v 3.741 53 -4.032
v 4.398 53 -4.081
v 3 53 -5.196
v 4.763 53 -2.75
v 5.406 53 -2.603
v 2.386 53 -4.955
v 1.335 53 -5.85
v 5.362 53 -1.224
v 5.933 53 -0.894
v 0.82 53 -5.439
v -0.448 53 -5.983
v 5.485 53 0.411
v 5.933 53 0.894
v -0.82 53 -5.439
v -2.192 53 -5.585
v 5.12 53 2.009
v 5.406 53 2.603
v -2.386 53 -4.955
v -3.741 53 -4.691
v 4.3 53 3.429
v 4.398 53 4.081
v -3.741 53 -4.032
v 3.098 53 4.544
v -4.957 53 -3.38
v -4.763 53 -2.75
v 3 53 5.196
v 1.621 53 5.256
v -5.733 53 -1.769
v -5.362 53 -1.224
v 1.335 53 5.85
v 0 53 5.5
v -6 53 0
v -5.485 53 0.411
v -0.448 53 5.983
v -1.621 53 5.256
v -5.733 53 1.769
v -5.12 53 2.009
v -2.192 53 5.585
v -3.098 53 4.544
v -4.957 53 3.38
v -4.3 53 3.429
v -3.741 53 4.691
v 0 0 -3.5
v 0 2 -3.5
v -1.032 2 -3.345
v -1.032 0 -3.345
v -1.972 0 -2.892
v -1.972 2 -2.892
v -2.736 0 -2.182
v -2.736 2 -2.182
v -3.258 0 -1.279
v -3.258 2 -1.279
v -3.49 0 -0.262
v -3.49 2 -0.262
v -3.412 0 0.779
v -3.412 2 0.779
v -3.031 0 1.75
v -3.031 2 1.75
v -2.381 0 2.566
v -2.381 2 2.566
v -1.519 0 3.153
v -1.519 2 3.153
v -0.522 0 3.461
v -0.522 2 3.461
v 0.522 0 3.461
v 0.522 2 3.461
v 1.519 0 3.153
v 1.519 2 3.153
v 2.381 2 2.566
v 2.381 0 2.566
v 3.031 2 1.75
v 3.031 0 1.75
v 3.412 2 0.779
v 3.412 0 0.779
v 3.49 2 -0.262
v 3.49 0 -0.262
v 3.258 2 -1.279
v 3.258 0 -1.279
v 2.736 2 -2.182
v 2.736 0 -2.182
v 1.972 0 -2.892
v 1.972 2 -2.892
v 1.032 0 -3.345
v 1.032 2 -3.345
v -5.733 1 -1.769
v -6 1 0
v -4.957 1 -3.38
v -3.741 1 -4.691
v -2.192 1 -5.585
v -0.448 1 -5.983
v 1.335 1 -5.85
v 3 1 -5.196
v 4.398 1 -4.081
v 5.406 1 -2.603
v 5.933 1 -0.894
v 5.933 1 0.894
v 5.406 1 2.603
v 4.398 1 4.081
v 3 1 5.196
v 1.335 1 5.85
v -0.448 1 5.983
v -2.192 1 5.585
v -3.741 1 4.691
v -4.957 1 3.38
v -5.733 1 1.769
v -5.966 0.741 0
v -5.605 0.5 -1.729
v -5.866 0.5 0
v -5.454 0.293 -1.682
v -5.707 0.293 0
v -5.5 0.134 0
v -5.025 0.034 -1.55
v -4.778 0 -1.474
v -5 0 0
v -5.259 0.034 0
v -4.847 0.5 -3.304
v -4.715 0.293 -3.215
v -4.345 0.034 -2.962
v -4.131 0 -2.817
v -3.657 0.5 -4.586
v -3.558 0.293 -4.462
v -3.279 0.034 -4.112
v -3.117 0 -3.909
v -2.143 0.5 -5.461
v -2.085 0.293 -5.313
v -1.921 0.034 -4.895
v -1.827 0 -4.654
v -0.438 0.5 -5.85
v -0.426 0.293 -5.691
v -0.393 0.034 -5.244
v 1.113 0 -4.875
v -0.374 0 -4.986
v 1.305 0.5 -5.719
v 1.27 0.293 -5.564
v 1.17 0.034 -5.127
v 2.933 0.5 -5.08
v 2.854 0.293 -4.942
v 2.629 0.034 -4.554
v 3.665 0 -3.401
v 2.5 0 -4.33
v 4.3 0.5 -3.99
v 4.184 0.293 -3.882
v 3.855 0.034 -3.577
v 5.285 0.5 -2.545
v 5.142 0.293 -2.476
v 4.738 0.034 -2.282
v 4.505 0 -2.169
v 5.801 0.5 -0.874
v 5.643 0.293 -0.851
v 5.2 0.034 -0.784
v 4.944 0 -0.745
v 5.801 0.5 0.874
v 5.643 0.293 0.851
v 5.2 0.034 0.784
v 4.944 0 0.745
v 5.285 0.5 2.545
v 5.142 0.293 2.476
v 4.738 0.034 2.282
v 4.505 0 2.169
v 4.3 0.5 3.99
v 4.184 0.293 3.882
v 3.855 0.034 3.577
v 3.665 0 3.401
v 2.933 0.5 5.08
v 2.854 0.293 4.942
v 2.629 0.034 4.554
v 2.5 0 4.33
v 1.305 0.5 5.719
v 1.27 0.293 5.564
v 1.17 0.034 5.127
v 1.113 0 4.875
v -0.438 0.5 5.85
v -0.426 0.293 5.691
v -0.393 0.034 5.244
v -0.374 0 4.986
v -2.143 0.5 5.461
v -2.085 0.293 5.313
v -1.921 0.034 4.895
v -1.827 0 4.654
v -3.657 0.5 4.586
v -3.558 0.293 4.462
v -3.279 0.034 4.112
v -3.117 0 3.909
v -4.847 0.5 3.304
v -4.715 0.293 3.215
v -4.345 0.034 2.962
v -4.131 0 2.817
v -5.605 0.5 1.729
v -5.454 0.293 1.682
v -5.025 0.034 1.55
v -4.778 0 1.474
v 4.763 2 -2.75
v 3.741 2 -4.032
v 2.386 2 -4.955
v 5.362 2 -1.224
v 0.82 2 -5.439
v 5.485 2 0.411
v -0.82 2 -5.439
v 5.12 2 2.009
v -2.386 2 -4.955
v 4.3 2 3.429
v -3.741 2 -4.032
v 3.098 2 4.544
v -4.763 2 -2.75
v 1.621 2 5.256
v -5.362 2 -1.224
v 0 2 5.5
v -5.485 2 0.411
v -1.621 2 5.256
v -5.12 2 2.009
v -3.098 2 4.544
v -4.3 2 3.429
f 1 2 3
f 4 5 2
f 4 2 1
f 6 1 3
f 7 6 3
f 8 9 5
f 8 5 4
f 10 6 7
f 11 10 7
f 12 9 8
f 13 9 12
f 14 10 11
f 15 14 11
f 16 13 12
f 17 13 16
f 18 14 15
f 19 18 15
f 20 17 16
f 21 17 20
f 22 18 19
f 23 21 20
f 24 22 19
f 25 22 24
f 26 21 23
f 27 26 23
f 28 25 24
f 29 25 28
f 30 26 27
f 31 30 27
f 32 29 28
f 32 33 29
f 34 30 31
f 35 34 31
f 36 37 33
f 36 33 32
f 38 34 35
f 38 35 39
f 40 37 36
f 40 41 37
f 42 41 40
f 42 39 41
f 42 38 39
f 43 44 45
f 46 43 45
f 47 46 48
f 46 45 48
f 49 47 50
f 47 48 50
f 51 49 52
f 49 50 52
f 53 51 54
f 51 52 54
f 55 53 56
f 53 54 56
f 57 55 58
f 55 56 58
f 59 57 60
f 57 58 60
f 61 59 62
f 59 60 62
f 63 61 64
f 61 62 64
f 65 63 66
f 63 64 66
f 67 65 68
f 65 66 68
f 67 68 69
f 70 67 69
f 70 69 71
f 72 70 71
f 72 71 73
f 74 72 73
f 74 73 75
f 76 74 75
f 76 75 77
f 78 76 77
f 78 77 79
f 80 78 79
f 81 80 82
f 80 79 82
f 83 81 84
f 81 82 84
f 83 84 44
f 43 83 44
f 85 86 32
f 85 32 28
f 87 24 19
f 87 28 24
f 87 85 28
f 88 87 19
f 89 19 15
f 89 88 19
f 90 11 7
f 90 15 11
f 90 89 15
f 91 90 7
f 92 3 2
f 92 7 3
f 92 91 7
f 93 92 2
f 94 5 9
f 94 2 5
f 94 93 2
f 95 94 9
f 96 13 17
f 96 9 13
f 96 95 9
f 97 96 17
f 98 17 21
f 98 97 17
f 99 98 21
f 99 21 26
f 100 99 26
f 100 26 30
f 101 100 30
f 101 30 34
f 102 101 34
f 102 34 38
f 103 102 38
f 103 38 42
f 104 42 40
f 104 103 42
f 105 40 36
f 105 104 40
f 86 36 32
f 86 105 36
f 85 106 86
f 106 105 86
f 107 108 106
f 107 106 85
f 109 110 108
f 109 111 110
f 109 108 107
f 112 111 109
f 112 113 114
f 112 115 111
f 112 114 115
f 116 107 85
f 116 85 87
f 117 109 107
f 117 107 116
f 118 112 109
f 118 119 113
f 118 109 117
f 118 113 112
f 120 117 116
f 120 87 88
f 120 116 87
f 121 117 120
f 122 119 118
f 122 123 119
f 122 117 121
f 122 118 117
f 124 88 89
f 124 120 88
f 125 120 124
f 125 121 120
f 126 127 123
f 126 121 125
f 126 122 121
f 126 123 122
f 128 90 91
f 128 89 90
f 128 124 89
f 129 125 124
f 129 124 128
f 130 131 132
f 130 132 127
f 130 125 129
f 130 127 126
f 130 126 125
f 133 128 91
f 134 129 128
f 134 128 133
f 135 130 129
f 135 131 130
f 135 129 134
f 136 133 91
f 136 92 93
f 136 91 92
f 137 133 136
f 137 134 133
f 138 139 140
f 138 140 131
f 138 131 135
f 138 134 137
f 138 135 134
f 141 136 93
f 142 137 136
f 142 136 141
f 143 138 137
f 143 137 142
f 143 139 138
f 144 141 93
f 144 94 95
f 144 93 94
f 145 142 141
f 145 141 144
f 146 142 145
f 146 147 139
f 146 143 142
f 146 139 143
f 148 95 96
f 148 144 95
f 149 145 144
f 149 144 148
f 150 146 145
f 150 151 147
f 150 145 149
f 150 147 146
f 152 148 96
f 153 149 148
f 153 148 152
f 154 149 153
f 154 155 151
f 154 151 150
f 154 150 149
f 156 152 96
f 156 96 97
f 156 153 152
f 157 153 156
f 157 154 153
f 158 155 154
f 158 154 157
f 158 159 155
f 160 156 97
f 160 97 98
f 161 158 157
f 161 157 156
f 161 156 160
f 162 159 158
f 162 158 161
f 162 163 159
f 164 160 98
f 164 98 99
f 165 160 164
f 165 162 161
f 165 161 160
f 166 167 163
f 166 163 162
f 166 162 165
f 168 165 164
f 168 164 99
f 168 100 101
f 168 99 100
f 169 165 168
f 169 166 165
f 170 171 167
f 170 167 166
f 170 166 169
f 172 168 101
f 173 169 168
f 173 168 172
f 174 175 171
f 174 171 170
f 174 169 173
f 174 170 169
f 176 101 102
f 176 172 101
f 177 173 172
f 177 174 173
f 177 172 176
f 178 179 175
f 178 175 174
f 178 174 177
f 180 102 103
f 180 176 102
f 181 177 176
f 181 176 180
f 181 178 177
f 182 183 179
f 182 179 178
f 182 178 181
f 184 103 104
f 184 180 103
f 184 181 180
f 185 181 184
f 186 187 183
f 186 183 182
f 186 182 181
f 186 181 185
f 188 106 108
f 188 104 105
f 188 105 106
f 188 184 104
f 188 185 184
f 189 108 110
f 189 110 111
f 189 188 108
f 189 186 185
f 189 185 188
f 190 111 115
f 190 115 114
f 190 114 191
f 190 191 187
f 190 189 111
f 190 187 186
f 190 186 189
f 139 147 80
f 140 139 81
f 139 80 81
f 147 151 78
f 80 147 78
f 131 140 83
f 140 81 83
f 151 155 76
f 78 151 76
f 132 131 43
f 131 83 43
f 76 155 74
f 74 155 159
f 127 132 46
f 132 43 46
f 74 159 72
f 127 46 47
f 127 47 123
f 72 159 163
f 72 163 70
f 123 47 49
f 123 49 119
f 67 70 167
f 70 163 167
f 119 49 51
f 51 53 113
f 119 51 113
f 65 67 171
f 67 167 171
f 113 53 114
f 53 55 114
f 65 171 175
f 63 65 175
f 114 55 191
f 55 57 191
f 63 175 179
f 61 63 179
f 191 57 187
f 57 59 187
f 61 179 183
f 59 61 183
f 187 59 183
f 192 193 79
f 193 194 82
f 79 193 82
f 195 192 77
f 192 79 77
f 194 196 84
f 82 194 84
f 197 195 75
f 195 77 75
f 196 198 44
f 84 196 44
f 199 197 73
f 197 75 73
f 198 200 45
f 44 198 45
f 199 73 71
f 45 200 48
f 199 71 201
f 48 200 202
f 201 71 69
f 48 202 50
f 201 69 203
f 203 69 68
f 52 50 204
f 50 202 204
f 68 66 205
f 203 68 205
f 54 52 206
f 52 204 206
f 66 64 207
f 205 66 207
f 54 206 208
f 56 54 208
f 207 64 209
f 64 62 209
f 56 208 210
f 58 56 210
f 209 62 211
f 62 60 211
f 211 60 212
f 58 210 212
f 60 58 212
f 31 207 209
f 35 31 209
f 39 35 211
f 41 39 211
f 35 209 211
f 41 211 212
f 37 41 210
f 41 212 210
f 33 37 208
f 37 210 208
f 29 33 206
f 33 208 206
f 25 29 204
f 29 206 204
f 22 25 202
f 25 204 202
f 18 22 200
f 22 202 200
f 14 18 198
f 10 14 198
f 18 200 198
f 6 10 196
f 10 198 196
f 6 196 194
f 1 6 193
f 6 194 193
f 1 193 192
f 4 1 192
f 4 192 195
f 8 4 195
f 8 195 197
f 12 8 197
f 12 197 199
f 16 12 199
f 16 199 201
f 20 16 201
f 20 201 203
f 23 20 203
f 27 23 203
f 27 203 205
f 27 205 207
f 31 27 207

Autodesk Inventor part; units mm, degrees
ref_plane "YZ Plane" through (0, 0, 0) normal (1, 0, 0) x (0, 1, 0)
ref_plane "XZ Plane" through (0, 0, 0) normal (0, 1, 0) x (-1, 0, 0)
sketch "Szkic1" plane through (0, 0, 0) normal (0, 1, 0) x (-1, 0, 0)
  circle A0 centre (0, 0) radius 6
  dimension "d0" = 12
extrude "Wyciągnięcie proste1" add sketch "Szkic1" along normal blind 53
sketch "Szkic2" plane through (0, 53, 0) normal (0, 1, 0) x (1, 0, 0)
  point P0 (0, 0)
  point P1 (0, 0)
ref_plane "Płaszczyzna konstrukcyjna1" through (0, 2, 0) normal (0, -1, 0) x (1, 0, 0)
hole "Otwór1" at (0, 53, 0) direction (0, -1, 0) diameter 11 depth 51
sketch "Szkic3" plane through (0, 0, 0) normal (0, -1, 0) x (1, 0, 0)
  point P0 (0, 0)
  point P1 (0, 0)
hole "Otwór2" at (0, 0, 0) direction (0, 1, 0) diameter 7 end through all
fillet "Zaokrąglenie1" radius 1 1 edges at (6, 0, 0)
properties part number "Jack_obudowa"
